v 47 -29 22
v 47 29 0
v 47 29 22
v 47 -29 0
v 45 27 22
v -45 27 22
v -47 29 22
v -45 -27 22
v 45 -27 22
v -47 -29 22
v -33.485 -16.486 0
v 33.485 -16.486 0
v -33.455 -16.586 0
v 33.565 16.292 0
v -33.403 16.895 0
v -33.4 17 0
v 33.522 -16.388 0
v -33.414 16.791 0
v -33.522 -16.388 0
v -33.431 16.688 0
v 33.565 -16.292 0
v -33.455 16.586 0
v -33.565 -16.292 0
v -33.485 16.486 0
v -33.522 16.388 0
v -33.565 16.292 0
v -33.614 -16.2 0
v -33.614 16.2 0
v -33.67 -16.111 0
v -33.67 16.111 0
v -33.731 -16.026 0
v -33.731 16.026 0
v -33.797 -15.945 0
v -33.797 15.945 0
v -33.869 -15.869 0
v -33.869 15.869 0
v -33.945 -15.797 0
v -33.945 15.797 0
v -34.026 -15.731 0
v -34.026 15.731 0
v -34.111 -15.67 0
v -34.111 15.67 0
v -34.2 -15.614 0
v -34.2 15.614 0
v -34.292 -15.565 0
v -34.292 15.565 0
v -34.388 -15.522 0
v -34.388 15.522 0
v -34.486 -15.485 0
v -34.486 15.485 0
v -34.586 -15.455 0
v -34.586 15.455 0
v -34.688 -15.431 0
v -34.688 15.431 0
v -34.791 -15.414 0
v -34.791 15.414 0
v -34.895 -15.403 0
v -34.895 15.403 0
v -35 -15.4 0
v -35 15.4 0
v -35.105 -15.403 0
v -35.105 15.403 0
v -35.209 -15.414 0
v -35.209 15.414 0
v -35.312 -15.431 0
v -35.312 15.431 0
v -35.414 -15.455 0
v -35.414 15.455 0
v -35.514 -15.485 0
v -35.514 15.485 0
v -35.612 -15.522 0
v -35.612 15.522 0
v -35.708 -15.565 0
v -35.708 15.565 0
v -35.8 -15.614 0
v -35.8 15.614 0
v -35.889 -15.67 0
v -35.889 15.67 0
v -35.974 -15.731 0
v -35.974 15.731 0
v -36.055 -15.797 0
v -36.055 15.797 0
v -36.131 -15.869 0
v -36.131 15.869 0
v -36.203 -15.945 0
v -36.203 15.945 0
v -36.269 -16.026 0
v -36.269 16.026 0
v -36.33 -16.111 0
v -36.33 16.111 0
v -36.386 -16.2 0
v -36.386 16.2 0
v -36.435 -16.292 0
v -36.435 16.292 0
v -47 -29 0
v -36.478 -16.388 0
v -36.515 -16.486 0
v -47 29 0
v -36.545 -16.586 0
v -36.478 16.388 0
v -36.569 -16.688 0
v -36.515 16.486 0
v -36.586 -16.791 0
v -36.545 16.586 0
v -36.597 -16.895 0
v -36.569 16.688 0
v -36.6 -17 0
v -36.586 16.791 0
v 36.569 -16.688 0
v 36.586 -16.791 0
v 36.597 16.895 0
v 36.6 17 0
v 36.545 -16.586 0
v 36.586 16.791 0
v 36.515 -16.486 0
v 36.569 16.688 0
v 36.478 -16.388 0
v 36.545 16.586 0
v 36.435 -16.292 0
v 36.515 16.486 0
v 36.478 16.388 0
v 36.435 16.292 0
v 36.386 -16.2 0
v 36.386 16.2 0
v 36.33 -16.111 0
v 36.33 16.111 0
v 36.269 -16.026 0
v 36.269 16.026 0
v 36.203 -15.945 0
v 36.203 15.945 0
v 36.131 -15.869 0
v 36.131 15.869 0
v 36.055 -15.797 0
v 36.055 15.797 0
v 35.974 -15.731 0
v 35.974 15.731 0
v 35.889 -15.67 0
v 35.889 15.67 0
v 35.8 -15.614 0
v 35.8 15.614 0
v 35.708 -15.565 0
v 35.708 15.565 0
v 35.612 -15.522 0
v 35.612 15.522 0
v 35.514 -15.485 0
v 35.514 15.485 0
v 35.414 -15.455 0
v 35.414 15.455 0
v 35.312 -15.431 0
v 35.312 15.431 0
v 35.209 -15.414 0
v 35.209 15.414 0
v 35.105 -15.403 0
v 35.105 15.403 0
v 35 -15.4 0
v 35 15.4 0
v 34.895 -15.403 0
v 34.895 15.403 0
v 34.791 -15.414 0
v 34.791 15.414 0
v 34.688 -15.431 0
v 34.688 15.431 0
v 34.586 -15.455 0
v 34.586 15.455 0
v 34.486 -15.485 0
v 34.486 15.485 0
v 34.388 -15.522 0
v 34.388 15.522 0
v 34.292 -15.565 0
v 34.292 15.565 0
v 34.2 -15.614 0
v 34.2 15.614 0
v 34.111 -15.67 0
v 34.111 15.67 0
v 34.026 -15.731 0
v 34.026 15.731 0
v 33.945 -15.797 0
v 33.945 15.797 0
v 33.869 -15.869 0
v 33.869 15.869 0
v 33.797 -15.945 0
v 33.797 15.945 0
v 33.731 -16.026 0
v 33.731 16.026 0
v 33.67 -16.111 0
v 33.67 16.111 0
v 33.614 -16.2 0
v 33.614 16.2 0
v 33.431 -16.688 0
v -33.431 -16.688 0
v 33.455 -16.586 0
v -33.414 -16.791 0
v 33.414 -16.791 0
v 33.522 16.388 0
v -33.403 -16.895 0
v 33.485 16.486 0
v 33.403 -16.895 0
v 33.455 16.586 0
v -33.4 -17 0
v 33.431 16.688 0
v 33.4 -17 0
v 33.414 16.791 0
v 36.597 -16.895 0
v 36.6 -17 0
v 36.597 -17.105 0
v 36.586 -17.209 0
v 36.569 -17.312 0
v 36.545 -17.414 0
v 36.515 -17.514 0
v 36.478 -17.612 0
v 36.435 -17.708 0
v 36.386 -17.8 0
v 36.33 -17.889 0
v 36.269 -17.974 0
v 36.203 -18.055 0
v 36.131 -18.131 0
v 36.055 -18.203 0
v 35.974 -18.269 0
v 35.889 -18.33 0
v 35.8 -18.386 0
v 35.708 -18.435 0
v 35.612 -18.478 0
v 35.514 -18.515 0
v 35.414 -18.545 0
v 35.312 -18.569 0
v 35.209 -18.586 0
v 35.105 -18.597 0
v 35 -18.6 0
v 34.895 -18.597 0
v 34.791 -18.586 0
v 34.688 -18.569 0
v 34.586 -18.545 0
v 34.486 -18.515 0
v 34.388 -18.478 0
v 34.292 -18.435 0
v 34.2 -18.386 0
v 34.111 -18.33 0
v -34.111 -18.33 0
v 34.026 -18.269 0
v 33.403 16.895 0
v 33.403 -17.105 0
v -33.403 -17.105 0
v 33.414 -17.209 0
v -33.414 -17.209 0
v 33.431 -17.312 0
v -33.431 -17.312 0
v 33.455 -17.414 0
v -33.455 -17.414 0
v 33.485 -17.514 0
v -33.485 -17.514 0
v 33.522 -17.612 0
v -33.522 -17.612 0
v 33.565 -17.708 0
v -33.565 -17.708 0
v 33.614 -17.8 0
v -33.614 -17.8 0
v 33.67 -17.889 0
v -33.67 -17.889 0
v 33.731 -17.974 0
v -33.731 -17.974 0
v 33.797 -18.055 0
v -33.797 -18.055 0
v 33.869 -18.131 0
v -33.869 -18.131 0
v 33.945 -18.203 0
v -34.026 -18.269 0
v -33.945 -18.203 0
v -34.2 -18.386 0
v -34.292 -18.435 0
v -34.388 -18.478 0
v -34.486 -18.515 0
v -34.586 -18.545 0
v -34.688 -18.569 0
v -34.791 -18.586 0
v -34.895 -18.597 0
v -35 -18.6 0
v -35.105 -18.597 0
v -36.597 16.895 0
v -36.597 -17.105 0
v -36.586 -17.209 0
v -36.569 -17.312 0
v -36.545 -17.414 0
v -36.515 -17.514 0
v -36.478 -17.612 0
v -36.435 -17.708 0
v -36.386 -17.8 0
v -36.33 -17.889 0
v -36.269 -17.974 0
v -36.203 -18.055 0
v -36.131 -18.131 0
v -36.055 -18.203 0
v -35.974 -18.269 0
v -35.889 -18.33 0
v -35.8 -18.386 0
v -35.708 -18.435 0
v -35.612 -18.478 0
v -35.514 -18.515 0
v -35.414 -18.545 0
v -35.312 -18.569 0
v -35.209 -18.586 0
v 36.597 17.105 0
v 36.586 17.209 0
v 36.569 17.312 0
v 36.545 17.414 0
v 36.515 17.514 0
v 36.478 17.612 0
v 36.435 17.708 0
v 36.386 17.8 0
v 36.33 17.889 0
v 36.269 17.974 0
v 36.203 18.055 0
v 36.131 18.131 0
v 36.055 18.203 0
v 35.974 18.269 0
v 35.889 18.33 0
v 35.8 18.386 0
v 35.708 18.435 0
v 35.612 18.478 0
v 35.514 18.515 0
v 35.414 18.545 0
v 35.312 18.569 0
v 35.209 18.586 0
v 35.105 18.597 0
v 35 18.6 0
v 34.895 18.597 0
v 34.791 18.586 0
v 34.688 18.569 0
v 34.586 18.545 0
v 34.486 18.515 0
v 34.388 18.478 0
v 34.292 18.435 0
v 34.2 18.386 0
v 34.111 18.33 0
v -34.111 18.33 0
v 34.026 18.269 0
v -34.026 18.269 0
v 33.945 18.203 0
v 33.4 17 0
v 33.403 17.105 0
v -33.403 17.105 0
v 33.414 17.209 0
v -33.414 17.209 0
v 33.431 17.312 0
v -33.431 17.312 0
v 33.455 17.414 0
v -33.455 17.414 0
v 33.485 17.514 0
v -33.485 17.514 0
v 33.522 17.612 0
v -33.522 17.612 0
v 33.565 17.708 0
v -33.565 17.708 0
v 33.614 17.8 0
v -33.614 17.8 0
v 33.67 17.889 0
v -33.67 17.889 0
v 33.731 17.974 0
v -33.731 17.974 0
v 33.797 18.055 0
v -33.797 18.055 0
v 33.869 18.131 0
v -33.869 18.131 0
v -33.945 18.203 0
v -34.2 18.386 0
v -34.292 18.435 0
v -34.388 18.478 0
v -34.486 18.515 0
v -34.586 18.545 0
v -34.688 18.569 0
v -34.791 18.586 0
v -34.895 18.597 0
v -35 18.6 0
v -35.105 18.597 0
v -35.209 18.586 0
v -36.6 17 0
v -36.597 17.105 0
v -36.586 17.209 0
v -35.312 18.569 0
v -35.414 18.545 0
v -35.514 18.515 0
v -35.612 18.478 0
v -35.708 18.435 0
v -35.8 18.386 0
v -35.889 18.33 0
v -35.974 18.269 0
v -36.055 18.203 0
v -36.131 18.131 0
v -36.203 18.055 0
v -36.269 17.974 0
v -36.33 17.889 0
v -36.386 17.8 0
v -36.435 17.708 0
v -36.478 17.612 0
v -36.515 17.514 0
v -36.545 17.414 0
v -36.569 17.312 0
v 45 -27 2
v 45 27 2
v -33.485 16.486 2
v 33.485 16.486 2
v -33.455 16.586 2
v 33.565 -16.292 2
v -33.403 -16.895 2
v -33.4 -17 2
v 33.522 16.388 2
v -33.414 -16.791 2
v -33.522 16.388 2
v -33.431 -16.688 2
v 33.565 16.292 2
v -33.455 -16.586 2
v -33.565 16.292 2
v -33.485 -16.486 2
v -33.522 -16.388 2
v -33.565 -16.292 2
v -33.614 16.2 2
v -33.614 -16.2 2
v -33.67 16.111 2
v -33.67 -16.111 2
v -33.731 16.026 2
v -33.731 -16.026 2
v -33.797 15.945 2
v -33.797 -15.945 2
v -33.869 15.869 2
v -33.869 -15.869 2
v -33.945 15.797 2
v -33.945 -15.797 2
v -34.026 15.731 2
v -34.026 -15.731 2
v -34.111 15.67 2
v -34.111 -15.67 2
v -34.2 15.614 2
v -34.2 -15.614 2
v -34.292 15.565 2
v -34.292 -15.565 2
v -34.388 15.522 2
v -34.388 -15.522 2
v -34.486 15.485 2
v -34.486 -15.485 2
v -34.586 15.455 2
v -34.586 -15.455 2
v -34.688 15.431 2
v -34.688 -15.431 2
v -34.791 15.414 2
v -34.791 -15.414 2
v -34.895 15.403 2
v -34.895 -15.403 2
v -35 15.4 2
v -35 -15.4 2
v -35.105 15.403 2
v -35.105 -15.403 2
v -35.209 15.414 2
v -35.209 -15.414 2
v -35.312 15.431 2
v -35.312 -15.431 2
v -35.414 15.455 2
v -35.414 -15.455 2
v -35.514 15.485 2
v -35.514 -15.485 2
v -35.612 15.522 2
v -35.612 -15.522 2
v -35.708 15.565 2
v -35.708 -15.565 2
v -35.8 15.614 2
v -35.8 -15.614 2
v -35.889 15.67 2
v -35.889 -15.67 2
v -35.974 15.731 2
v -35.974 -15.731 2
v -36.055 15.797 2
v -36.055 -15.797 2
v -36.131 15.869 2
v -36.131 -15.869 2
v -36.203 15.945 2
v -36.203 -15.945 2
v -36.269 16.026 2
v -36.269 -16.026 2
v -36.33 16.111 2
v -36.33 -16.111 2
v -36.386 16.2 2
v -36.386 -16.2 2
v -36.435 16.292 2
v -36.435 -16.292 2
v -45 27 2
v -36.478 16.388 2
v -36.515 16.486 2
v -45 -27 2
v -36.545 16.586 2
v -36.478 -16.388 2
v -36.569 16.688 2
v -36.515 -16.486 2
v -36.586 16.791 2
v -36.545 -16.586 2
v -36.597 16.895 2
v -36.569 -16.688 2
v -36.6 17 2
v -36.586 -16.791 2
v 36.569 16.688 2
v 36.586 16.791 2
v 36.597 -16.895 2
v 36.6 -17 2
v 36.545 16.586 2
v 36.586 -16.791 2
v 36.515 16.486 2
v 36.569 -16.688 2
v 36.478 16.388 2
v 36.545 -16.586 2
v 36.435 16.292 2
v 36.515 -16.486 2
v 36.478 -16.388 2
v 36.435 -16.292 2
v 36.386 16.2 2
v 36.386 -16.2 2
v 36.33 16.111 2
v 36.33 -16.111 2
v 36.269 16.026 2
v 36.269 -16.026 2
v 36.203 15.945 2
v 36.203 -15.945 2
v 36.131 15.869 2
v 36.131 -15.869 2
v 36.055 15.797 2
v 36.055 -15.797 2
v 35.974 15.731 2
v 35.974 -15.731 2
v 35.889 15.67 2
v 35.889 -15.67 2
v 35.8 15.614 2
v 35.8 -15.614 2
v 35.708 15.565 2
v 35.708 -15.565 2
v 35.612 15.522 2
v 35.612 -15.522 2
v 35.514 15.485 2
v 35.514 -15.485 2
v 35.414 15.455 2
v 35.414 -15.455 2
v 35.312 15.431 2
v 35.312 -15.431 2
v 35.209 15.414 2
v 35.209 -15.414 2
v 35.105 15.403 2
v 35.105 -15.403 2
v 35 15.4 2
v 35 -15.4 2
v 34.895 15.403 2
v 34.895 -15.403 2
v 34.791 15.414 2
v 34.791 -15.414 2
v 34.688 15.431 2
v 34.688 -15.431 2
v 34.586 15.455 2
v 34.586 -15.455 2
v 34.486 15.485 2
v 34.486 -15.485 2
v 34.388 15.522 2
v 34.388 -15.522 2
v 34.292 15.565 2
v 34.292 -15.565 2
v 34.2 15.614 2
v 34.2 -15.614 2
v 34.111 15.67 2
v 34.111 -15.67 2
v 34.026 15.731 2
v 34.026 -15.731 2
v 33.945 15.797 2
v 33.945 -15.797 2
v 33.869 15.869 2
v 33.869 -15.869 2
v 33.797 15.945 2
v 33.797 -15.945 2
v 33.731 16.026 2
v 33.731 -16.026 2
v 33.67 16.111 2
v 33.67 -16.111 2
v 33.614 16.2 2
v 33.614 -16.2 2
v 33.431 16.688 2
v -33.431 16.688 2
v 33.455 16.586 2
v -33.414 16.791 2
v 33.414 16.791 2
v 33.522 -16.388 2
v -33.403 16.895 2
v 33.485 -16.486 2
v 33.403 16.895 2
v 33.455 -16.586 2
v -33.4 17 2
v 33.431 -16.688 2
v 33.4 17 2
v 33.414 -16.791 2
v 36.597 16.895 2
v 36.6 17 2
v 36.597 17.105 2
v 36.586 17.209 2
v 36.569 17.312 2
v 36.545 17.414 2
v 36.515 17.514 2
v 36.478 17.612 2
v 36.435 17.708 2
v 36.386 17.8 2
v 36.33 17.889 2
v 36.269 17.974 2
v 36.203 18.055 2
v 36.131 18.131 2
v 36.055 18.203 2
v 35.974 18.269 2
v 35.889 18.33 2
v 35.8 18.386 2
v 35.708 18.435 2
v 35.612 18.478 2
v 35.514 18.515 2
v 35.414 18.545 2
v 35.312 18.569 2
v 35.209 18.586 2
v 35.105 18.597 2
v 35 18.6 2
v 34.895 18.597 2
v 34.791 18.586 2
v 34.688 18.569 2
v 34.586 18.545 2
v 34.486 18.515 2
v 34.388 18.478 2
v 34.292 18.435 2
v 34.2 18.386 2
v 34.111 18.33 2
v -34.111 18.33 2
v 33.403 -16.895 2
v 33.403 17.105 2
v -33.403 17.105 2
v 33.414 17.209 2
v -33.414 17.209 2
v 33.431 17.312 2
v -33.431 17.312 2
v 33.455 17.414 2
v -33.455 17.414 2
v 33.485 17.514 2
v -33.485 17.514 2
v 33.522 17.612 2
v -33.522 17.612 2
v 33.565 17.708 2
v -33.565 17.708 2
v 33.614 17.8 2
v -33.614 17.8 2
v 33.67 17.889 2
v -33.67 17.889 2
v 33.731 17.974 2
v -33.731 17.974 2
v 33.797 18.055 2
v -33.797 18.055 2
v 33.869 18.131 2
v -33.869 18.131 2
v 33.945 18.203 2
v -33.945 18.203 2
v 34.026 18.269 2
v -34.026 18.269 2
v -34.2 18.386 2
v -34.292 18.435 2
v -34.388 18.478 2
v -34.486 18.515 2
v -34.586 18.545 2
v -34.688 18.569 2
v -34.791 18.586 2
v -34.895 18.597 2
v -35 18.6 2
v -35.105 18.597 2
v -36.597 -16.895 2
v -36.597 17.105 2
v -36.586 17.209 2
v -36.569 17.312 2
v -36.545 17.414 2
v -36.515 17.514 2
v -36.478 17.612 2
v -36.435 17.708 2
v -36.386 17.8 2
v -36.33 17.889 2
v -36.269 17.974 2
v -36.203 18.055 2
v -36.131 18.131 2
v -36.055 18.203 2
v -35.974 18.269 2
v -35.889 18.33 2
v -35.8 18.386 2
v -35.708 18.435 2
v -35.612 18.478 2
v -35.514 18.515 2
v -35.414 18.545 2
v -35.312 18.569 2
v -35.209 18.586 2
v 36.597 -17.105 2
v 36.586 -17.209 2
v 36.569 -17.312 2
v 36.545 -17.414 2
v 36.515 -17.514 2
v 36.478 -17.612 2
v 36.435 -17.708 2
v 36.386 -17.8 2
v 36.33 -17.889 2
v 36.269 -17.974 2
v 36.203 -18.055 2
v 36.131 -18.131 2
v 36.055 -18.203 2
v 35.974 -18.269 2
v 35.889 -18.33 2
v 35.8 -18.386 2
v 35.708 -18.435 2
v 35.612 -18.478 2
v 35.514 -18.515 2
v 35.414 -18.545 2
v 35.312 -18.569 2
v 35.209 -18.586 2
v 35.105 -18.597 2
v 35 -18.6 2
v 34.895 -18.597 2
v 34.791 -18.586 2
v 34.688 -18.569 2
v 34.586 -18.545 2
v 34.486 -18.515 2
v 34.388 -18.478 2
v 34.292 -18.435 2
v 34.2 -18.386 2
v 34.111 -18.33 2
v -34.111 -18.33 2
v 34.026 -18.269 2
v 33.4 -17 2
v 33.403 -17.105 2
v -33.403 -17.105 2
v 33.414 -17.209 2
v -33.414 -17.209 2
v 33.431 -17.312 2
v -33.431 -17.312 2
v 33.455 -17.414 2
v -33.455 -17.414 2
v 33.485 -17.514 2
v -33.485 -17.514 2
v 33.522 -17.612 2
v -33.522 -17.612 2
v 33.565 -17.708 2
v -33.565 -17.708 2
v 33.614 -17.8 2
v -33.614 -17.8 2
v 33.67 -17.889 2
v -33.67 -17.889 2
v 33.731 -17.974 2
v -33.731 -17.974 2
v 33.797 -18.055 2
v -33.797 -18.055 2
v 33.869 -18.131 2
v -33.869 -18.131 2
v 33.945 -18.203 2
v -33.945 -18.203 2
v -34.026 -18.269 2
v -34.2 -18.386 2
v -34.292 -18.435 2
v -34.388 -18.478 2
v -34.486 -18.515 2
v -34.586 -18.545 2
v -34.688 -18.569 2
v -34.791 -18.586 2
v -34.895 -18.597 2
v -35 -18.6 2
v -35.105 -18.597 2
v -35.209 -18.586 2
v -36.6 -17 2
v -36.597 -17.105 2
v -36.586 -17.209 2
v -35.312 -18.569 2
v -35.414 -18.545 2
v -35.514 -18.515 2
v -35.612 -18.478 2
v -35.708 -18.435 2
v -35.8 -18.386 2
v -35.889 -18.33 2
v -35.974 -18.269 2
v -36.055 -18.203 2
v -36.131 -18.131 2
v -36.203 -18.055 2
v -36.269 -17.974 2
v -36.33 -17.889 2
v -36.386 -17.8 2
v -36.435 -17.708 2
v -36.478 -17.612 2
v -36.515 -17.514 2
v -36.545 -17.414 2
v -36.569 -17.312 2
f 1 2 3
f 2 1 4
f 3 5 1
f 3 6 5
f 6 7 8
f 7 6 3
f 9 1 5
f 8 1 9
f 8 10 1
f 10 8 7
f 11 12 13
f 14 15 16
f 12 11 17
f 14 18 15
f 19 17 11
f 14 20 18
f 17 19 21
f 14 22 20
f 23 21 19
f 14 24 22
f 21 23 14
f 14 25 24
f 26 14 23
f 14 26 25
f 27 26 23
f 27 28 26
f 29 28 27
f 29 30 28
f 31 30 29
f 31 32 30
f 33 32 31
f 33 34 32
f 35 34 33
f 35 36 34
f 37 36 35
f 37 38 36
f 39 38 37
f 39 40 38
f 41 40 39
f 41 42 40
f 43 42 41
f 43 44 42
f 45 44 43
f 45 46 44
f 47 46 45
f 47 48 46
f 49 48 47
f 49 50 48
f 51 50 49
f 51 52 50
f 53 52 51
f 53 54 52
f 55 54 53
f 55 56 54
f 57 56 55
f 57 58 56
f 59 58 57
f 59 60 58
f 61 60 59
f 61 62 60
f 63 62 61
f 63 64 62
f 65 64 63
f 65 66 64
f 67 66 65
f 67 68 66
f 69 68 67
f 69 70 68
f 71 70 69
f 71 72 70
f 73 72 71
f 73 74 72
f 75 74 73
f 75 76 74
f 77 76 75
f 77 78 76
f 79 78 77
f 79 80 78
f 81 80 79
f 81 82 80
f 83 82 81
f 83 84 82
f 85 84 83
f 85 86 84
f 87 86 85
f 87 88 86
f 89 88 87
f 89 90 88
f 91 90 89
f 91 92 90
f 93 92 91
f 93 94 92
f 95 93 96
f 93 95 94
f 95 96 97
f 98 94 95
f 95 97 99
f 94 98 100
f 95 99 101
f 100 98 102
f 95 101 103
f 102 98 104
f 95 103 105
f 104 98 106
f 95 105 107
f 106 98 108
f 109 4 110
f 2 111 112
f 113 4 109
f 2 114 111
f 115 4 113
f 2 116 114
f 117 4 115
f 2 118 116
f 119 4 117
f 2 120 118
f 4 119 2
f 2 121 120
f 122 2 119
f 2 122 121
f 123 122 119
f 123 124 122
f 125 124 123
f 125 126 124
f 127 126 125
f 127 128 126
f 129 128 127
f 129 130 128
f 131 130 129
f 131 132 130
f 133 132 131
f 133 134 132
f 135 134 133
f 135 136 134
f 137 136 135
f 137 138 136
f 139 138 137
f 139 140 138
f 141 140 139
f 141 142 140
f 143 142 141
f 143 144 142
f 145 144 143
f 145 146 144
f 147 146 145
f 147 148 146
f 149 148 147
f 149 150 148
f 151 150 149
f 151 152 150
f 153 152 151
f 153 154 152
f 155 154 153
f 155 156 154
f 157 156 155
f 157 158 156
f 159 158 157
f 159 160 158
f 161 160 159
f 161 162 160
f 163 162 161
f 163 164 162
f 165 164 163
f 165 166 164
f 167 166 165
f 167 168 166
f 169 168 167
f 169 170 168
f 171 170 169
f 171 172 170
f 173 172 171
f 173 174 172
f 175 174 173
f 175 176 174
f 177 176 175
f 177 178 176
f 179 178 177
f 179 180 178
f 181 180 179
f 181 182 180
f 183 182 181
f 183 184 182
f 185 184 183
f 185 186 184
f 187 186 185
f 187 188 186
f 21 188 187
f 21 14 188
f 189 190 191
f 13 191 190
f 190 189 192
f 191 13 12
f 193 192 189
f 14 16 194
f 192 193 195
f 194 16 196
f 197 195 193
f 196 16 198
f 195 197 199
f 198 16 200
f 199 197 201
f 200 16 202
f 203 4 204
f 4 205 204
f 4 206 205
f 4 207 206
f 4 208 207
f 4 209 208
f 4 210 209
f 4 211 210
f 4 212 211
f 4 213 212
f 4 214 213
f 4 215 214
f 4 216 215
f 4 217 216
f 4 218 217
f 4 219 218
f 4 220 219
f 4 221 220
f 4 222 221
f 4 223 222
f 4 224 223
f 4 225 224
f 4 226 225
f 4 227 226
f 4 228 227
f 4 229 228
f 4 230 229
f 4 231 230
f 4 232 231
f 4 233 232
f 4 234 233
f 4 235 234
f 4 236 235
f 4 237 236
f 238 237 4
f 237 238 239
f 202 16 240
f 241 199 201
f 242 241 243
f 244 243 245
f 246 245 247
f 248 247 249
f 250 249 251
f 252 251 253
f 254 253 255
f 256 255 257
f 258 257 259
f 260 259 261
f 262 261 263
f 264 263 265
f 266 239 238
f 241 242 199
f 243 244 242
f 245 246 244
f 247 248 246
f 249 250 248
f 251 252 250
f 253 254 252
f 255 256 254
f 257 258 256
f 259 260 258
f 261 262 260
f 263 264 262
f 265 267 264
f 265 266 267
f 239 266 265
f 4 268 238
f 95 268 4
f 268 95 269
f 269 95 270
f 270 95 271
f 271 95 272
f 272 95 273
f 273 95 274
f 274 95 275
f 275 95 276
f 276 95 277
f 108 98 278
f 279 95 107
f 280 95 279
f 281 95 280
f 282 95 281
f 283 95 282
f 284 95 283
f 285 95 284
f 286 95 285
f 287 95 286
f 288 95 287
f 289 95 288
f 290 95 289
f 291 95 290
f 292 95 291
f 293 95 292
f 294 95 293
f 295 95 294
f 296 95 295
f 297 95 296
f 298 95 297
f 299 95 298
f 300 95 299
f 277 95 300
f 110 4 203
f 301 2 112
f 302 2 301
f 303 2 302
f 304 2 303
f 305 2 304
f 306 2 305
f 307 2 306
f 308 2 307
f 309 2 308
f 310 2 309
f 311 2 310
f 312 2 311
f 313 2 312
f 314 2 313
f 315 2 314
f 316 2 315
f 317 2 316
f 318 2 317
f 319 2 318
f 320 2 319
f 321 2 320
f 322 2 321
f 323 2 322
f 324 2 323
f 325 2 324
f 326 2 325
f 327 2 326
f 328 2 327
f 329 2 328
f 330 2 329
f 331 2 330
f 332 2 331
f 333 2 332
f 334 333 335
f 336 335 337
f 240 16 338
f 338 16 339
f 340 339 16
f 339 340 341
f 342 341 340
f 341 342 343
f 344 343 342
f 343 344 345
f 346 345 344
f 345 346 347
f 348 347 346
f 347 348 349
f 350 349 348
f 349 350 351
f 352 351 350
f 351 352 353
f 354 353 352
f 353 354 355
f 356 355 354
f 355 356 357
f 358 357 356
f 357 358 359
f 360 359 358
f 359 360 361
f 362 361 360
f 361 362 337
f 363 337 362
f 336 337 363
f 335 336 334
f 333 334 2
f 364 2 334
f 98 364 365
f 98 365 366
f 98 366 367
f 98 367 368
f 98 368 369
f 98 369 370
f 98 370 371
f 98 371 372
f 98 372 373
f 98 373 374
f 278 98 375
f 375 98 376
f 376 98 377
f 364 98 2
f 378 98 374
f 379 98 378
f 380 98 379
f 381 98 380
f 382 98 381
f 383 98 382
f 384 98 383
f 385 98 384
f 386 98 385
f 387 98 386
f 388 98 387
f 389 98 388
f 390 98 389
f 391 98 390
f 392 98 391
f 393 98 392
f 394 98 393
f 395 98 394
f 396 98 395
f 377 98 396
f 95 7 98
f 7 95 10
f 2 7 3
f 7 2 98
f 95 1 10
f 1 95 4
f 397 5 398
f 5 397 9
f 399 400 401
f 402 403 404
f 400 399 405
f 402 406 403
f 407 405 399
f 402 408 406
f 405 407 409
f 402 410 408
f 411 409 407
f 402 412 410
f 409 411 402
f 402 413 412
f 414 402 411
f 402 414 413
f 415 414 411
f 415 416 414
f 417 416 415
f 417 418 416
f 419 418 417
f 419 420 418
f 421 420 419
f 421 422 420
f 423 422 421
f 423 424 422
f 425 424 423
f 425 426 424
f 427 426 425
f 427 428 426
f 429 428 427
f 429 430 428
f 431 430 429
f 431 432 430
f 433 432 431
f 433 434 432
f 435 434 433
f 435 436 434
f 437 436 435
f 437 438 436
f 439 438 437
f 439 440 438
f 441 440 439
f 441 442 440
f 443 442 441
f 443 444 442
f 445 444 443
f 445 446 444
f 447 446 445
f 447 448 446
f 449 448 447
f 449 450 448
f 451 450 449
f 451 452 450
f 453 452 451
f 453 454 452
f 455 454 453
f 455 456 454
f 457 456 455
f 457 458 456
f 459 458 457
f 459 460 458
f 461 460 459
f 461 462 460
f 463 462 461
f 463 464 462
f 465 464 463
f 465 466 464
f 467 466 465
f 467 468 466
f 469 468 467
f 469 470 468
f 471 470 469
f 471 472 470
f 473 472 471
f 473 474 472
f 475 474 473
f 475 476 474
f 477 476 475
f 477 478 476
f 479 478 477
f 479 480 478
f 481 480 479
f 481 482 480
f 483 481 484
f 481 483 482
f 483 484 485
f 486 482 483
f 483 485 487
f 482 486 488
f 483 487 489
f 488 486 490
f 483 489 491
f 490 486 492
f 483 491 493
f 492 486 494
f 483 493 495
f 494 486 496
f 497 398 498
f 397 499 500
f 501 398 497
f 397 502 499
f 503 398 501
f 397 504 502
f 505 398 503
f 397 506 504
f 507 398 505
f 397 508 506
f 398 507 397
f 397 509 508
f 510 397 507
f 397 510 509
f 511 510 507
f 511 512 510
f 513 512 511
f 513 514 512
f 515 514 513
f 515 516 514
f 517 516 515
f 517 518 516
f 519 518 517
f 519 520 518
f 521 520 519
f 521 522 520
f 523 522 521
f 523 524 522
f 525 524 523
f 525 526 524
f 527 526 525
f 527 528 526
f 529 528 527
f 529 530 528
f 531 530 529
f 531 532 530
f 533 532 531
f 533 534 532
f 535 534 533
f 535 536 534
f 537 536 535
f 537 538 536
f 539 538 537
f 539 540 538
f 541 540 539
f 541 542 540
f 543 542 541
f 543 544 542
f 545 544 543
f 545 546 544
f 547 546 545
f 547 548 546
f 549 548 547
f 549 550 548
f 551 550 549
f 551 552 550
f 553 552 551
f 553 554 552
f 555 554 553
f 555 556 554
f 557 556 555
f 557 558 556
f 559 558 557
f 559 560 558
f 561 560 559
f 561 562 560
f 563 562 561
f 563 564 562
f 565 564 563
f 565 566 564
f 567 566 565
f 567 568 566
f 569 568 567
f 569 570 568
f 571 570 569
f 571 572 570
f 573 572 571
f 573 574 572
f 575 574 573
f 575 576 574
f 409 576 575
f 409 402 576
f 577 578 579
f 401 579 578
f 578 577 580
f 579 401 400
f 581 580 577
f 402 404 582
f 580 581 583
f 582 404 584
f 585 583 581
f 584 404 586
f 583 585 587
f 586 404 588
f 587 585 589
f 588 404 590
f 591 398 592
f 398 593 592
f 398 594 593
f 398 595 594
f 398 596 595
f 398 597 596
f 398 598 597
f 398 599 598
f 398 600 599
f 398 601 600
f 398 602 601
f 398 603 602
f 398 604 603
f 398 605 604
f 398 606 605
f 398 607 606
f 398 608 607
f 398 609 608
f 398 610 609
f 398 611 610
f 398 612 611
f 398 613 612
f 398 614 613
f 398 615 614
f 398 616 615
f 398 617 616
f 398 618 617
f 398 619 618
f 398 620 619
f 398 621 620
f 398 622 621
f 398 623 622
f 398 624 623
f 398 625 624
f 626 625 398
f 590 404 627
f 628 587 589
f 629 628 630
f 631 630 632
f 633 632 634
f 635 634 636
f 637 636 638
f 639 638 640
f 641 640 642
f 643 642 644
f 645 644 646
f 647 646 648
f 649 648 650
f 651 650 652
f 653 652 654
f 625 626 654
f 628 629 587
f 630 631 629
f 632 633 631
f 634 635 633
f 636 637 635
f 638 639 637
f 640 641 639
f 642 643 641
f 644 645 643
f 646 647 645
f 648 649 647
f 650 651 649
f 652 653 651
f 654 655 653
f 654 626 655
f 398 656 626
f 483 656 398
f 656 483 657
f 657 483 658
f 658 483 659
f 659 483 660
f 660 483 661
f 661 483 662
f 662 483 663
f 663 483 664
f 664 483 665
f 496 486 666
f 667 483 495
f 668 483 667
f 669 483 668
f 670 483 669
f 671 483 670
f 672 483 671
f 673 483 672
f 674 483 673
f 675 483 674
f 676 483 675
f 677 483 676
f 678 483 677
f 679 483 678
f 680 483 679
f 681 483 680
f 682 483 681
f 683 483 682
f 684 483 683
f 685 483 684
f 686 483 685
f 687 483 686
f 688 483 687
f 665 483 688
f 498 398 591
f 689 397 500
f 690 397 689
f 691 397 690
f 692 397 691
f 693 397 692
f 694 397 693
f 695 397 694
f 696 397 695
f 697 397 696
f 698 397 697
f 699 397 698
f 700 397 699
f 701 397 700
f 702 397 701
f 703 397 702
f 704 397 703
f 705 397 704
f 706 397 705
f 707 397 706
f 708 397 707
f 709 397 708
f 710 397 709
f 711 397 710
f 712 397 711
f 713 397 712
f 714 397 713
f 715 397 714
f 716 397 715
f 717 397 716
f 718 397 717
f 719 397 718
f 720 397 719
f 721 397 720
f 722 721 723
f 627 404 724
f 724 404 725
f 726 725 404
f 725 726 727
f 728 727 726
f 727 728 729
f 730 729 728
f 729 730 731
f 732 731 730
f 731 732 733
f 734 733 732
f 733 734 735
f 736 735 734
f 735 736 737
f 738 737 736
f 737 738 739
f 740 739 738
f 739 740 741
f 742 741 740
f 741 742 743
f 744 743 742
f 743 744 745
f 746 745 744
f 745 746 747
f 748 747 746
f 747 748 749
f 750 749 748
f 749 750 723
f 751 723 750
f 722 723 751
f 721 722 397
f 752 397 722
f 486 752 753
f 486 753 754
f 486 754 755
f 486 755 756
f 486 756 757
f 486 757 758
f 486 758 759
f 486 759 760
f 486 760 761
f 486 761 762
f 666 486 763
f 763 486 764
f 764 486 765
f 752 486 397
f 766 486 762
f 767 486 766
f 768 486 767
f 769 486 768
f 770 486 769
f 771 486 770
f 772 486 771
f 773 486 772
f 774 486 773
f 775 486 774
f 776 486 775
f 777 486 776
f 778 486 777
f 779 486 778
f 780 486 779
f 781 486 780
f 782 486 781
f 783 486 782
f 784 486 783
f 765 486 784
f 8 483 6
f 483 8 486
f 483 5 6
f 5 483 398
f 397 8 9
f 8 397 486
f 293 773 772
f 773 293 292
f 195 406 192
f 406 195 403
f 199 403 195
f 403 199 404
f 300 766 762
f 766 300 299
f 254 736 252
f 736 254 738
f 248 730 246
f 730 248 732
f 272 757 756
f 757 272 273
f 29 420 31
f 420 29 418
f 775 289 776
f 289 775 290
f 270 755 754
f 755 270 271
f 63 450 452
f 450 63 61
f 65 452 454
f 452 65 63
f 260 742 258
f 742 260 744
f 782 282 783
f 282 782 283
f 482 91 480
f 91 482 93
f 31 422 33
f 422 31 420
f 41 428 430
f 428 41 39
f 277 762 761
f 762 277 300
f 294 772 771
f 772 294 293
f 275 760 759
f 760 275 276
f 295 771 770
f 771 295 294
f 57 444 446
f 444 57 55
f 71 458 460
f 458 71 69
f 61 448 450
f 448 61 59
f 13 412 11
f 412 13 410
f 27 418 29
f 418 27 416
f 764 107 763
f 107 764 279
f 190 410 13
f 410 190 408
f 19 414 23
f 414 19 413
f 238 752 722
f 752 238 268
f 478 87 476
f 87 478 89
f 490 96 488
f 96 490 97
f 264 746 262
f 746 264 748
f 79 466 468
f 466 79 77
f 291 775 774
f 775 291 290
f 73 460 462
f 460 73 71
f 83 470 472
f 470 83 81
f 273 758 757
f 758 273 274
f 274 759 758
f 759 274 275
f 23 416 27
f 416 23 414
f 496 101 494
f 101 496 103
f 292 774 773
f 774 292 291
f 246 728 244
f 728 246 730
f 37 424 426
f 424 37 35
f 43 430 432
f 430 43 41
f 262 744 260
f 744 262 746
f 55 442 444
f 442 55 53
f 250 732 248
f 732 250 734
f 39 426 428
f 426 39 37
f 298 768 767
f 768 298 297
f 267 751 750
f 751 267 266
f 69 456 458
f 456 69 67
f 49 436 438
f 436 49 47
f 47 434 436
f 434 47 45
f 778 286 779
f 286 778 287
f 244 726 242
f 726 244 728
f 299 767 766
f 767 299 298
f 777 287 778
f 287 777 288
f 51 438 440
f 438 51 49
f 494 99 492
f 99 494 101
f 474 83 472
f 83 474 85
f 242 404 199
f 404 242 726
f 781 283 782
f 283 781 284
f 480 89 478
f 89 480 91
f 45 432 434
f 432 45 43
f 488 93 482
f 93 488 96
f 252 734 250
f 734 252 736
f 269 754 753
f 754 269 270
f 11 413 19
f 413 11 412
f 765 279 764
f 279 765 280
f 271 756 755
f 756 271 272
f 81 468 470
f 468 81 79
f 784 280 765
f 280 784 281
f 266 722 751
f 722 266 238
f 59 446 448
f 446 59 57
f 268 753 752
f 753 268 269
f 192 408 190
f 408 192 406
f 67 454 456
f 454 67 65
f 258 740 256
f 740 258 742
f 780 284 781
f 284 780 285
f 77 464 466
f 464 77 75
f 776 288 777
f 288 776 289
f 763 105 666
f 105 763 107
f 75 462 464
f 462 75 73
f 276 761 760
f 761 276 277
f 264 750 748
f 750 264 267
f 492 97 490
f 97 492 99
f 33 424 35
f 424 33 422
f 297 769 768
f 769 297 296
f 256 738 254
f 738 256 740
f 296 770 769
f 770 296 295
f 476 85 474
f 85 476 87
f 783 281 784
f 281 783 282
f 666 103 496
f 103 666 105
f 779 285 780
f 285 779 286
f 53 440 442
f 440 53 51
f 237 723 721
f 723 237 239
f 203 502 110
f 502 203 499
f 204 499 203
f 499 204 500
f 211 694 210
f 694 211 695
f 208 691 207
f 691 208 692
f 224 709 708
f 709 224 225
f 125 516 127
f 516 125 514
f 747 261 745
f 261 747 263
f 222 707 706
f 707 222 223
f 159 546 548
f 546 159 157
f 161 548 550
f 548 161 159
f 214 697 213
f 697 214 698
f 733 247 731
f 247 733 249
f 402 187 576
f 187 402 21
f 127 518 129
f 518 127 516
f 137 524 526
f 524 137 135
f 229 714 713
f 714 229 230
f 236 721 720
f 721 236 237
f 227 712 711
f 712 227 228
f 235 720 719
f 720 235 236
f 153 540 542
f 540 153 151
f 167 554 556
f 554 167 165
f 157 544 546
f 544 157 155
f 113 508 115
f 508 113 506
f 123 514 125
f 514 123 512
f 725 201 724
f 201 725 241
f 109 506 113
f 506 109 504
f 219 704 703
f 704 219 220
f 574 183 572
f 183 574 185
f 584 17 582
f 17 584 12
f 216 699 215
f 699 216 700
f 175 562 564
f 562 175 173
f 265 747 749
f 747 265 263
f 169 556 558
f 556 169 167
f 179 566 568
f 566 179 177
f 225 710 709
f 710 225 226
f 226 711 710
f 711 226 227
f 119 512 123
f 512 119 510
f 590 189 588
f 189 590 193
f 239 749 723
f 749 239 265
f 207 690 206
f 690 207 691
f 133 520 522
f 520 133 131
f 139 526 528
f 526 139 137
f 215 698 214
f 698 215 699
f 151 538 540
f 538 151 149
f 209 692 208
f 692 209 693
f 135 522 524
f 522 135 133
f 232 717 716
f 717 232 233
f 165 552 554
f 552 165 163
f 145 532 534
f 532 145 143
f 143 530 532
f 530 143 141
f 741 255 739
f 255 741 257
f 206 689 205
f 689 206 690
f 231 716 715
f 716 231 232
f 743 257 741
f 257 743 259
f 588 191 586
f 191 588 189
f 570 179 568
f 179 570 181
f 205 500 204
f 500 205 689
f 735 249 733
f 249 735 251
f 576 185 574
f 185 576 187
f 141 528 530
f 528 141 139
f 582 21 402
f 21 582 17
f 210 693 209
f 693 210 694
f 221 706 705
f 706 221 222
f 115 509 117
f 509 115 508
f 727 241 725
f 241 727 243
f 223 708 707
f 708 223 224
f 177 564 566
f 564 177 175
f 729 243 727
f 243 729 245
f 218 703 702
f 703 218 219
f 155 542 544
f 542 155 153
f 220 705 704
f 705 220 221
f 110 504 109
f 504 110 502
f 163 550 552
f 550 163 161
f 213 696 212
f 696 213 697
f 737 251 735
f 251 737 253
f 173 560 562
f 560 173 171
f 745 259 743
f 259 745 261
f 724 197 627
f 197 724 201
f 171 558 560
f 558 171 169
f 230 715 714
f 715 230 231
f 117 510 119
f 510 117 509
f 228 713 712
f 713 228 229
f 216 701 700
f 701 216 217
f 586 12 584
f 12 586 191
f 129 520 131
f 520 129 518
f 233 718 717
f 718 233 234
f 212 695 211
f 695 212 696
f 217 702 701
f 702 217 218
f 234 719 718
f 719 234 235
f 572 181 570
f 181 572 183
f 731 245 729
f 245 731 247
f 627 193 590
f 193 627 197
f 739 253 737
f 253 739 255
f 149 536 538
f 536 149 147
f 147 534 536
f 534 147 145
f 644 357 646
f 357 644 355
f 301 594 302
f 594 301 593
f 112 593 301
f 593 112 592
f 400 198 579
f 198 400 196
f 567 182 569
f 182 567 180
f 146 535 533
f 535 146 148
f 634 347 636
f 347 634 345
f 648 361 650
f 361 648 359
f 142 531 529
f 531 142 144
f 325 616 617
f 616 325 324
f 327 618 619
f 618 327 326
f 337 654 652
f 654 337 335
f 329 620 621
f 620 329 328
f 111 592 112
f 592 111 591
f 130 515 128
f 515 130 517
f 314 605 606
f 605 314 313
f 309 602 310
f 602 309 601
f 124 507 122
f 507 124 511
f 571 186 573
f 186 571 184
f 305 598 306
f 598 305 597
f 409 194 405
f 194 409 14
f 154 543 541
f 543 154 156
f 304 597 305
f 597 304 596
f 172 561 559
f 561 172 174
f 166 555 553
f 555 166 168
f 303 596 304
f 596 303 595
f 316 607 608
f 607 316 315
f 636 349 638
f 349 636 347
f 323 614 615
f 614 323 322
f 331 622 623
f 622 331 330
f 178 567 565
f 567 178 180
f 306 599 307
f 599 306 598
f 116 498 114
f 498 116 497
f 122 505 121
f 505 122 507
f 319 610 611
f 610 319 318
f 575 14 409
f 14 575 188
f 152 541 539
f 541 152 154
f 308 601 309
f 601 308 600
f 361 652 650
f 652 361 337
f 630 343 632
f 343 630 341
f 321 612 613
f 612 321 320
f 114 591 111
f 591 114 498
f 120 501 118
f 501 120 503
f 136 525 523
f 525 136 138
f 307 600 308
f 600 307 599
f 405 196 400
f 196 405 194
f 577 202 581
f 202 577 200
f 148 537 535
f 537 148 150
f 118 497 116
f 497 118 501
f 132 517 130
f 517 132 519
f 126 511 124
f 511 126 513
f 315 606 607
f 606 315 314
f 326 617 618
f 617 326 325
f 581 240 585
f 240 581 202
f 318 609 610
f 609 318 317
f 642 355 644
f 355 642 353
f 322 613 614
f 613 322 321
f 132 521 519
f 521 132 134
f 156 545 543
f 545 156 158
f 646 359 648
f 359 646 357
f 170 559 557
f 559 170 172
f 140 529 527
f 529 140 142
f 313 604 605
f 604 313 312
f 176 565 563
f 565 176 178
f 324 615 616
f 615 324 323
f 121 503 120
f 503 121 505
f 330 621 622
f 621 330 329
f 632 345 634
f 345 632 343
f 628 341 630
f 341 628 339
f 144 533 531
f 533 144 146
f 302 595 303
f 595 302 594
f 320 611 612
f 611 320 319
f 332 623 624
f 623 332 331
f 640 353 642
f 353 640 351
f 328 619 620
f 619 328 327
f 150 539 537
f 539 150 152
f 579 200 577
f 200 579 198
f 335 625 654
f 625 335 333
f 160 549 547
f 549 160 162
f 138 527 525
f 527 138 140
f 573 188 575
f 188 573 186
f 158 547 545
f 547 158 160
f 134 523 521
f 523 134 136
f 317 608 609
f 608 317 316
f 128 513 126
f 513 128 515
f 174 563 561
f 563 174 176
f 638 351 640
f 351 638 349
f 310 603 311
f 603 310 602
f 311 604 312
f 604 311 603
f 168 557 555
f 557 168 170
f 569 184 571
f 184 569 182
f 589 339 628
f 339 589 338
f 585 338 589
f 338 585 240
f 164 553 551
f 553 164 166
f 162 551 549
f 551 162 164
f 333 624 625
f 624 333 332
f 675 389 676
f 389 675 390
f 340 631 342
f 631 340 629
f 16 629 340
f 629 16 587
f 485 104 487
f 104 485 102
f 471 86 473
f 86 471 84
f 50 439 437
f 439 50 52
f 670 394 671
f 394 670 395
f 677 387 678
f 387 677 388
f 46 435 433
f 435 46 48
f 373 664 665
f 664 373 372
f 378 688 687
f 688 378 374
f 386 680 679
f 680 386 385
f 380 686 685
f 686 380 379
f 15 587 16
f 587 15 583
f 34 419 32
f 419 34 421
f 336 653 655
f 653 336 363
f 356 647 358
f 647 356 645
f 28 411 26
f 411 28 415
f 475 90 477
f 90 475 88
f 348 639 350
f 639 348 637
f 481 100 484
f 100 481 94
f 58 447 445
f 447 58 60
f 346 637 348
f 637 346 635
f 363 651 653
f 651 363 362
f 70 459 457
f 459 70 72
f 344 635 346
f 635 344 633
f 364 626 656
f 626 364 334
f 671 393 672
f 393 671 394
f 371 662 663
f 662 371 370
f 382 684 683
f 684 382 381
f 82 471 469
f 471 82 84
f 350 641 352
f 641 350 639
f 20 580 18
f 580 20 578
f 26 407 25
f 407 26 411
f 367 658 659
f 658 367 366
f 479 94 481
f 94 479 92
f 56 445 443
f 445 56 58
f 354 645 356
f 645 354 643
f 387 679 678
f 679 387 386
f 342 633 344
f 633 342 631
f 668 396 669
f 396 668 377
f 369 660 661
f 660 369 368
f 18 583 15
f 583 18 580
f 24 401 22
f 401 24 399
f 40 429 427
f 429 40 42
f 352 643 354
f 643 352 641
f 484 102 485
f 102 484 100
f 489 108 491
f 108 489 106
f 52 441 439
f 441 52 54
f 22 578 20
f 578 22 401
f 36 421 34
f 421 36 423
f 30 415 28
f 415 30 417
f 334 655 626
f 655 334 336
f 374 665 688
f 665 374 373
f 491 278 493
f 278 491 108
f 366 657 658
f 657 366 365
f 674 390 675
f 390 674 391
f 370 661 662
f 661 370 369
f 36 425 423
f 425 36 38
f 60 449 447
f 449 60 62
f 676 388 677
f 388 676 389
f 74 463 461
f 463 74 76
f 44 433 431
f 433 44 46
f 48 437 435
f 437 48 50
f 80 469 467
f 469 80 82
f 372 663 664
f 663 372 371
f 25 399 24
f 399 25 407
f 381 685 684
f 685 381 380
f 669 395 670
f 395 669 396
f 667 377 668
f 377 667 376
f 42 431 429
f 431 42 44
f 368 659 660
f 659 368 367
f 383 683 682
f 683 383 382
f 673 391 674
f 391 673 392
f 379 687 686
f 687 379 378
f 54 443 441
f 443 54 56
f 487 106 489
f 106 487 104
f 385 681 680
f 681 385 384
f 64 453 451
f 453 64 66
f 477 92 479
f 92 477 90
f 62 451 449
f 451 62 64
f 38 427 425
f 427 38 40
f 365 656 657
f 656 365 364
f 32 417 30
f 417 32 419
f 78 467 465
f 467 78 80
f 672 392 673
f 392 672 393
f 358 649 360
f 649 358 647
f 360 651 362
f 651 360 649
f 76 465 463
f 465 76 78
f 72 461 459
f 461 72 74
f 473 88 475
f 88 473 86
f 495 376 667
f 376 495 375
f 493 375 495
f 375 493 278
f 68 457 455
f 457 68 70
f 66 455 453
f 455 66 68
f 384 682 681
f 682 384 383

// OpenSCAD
// Generated by PromptCAD Studio
$fn = 96;

difference() {
  union() {
    difference() {
      translate([-47, -29, 0]) cube([94, 58, 22]);
      translate([-45, -27, 2]) cube([90, 54, 22]);
    }
  }
  union() {
    translate([-35, -17, -1]) rotate([0, 0, 0]) cylinder(d=3.2, h=24);
    translate([35, -17, -1]) rotate([0, 0, 0]) cylinder(d=3.2, h=24);
    translate([35, 17, -1]) rotate([0, 0, 0]) cylinder(d=3.2, h=24);
    translate([-35, 17, -1]) rotate([0, 0, 0]) cylinder(d=3.2, h=24);
  }
}
